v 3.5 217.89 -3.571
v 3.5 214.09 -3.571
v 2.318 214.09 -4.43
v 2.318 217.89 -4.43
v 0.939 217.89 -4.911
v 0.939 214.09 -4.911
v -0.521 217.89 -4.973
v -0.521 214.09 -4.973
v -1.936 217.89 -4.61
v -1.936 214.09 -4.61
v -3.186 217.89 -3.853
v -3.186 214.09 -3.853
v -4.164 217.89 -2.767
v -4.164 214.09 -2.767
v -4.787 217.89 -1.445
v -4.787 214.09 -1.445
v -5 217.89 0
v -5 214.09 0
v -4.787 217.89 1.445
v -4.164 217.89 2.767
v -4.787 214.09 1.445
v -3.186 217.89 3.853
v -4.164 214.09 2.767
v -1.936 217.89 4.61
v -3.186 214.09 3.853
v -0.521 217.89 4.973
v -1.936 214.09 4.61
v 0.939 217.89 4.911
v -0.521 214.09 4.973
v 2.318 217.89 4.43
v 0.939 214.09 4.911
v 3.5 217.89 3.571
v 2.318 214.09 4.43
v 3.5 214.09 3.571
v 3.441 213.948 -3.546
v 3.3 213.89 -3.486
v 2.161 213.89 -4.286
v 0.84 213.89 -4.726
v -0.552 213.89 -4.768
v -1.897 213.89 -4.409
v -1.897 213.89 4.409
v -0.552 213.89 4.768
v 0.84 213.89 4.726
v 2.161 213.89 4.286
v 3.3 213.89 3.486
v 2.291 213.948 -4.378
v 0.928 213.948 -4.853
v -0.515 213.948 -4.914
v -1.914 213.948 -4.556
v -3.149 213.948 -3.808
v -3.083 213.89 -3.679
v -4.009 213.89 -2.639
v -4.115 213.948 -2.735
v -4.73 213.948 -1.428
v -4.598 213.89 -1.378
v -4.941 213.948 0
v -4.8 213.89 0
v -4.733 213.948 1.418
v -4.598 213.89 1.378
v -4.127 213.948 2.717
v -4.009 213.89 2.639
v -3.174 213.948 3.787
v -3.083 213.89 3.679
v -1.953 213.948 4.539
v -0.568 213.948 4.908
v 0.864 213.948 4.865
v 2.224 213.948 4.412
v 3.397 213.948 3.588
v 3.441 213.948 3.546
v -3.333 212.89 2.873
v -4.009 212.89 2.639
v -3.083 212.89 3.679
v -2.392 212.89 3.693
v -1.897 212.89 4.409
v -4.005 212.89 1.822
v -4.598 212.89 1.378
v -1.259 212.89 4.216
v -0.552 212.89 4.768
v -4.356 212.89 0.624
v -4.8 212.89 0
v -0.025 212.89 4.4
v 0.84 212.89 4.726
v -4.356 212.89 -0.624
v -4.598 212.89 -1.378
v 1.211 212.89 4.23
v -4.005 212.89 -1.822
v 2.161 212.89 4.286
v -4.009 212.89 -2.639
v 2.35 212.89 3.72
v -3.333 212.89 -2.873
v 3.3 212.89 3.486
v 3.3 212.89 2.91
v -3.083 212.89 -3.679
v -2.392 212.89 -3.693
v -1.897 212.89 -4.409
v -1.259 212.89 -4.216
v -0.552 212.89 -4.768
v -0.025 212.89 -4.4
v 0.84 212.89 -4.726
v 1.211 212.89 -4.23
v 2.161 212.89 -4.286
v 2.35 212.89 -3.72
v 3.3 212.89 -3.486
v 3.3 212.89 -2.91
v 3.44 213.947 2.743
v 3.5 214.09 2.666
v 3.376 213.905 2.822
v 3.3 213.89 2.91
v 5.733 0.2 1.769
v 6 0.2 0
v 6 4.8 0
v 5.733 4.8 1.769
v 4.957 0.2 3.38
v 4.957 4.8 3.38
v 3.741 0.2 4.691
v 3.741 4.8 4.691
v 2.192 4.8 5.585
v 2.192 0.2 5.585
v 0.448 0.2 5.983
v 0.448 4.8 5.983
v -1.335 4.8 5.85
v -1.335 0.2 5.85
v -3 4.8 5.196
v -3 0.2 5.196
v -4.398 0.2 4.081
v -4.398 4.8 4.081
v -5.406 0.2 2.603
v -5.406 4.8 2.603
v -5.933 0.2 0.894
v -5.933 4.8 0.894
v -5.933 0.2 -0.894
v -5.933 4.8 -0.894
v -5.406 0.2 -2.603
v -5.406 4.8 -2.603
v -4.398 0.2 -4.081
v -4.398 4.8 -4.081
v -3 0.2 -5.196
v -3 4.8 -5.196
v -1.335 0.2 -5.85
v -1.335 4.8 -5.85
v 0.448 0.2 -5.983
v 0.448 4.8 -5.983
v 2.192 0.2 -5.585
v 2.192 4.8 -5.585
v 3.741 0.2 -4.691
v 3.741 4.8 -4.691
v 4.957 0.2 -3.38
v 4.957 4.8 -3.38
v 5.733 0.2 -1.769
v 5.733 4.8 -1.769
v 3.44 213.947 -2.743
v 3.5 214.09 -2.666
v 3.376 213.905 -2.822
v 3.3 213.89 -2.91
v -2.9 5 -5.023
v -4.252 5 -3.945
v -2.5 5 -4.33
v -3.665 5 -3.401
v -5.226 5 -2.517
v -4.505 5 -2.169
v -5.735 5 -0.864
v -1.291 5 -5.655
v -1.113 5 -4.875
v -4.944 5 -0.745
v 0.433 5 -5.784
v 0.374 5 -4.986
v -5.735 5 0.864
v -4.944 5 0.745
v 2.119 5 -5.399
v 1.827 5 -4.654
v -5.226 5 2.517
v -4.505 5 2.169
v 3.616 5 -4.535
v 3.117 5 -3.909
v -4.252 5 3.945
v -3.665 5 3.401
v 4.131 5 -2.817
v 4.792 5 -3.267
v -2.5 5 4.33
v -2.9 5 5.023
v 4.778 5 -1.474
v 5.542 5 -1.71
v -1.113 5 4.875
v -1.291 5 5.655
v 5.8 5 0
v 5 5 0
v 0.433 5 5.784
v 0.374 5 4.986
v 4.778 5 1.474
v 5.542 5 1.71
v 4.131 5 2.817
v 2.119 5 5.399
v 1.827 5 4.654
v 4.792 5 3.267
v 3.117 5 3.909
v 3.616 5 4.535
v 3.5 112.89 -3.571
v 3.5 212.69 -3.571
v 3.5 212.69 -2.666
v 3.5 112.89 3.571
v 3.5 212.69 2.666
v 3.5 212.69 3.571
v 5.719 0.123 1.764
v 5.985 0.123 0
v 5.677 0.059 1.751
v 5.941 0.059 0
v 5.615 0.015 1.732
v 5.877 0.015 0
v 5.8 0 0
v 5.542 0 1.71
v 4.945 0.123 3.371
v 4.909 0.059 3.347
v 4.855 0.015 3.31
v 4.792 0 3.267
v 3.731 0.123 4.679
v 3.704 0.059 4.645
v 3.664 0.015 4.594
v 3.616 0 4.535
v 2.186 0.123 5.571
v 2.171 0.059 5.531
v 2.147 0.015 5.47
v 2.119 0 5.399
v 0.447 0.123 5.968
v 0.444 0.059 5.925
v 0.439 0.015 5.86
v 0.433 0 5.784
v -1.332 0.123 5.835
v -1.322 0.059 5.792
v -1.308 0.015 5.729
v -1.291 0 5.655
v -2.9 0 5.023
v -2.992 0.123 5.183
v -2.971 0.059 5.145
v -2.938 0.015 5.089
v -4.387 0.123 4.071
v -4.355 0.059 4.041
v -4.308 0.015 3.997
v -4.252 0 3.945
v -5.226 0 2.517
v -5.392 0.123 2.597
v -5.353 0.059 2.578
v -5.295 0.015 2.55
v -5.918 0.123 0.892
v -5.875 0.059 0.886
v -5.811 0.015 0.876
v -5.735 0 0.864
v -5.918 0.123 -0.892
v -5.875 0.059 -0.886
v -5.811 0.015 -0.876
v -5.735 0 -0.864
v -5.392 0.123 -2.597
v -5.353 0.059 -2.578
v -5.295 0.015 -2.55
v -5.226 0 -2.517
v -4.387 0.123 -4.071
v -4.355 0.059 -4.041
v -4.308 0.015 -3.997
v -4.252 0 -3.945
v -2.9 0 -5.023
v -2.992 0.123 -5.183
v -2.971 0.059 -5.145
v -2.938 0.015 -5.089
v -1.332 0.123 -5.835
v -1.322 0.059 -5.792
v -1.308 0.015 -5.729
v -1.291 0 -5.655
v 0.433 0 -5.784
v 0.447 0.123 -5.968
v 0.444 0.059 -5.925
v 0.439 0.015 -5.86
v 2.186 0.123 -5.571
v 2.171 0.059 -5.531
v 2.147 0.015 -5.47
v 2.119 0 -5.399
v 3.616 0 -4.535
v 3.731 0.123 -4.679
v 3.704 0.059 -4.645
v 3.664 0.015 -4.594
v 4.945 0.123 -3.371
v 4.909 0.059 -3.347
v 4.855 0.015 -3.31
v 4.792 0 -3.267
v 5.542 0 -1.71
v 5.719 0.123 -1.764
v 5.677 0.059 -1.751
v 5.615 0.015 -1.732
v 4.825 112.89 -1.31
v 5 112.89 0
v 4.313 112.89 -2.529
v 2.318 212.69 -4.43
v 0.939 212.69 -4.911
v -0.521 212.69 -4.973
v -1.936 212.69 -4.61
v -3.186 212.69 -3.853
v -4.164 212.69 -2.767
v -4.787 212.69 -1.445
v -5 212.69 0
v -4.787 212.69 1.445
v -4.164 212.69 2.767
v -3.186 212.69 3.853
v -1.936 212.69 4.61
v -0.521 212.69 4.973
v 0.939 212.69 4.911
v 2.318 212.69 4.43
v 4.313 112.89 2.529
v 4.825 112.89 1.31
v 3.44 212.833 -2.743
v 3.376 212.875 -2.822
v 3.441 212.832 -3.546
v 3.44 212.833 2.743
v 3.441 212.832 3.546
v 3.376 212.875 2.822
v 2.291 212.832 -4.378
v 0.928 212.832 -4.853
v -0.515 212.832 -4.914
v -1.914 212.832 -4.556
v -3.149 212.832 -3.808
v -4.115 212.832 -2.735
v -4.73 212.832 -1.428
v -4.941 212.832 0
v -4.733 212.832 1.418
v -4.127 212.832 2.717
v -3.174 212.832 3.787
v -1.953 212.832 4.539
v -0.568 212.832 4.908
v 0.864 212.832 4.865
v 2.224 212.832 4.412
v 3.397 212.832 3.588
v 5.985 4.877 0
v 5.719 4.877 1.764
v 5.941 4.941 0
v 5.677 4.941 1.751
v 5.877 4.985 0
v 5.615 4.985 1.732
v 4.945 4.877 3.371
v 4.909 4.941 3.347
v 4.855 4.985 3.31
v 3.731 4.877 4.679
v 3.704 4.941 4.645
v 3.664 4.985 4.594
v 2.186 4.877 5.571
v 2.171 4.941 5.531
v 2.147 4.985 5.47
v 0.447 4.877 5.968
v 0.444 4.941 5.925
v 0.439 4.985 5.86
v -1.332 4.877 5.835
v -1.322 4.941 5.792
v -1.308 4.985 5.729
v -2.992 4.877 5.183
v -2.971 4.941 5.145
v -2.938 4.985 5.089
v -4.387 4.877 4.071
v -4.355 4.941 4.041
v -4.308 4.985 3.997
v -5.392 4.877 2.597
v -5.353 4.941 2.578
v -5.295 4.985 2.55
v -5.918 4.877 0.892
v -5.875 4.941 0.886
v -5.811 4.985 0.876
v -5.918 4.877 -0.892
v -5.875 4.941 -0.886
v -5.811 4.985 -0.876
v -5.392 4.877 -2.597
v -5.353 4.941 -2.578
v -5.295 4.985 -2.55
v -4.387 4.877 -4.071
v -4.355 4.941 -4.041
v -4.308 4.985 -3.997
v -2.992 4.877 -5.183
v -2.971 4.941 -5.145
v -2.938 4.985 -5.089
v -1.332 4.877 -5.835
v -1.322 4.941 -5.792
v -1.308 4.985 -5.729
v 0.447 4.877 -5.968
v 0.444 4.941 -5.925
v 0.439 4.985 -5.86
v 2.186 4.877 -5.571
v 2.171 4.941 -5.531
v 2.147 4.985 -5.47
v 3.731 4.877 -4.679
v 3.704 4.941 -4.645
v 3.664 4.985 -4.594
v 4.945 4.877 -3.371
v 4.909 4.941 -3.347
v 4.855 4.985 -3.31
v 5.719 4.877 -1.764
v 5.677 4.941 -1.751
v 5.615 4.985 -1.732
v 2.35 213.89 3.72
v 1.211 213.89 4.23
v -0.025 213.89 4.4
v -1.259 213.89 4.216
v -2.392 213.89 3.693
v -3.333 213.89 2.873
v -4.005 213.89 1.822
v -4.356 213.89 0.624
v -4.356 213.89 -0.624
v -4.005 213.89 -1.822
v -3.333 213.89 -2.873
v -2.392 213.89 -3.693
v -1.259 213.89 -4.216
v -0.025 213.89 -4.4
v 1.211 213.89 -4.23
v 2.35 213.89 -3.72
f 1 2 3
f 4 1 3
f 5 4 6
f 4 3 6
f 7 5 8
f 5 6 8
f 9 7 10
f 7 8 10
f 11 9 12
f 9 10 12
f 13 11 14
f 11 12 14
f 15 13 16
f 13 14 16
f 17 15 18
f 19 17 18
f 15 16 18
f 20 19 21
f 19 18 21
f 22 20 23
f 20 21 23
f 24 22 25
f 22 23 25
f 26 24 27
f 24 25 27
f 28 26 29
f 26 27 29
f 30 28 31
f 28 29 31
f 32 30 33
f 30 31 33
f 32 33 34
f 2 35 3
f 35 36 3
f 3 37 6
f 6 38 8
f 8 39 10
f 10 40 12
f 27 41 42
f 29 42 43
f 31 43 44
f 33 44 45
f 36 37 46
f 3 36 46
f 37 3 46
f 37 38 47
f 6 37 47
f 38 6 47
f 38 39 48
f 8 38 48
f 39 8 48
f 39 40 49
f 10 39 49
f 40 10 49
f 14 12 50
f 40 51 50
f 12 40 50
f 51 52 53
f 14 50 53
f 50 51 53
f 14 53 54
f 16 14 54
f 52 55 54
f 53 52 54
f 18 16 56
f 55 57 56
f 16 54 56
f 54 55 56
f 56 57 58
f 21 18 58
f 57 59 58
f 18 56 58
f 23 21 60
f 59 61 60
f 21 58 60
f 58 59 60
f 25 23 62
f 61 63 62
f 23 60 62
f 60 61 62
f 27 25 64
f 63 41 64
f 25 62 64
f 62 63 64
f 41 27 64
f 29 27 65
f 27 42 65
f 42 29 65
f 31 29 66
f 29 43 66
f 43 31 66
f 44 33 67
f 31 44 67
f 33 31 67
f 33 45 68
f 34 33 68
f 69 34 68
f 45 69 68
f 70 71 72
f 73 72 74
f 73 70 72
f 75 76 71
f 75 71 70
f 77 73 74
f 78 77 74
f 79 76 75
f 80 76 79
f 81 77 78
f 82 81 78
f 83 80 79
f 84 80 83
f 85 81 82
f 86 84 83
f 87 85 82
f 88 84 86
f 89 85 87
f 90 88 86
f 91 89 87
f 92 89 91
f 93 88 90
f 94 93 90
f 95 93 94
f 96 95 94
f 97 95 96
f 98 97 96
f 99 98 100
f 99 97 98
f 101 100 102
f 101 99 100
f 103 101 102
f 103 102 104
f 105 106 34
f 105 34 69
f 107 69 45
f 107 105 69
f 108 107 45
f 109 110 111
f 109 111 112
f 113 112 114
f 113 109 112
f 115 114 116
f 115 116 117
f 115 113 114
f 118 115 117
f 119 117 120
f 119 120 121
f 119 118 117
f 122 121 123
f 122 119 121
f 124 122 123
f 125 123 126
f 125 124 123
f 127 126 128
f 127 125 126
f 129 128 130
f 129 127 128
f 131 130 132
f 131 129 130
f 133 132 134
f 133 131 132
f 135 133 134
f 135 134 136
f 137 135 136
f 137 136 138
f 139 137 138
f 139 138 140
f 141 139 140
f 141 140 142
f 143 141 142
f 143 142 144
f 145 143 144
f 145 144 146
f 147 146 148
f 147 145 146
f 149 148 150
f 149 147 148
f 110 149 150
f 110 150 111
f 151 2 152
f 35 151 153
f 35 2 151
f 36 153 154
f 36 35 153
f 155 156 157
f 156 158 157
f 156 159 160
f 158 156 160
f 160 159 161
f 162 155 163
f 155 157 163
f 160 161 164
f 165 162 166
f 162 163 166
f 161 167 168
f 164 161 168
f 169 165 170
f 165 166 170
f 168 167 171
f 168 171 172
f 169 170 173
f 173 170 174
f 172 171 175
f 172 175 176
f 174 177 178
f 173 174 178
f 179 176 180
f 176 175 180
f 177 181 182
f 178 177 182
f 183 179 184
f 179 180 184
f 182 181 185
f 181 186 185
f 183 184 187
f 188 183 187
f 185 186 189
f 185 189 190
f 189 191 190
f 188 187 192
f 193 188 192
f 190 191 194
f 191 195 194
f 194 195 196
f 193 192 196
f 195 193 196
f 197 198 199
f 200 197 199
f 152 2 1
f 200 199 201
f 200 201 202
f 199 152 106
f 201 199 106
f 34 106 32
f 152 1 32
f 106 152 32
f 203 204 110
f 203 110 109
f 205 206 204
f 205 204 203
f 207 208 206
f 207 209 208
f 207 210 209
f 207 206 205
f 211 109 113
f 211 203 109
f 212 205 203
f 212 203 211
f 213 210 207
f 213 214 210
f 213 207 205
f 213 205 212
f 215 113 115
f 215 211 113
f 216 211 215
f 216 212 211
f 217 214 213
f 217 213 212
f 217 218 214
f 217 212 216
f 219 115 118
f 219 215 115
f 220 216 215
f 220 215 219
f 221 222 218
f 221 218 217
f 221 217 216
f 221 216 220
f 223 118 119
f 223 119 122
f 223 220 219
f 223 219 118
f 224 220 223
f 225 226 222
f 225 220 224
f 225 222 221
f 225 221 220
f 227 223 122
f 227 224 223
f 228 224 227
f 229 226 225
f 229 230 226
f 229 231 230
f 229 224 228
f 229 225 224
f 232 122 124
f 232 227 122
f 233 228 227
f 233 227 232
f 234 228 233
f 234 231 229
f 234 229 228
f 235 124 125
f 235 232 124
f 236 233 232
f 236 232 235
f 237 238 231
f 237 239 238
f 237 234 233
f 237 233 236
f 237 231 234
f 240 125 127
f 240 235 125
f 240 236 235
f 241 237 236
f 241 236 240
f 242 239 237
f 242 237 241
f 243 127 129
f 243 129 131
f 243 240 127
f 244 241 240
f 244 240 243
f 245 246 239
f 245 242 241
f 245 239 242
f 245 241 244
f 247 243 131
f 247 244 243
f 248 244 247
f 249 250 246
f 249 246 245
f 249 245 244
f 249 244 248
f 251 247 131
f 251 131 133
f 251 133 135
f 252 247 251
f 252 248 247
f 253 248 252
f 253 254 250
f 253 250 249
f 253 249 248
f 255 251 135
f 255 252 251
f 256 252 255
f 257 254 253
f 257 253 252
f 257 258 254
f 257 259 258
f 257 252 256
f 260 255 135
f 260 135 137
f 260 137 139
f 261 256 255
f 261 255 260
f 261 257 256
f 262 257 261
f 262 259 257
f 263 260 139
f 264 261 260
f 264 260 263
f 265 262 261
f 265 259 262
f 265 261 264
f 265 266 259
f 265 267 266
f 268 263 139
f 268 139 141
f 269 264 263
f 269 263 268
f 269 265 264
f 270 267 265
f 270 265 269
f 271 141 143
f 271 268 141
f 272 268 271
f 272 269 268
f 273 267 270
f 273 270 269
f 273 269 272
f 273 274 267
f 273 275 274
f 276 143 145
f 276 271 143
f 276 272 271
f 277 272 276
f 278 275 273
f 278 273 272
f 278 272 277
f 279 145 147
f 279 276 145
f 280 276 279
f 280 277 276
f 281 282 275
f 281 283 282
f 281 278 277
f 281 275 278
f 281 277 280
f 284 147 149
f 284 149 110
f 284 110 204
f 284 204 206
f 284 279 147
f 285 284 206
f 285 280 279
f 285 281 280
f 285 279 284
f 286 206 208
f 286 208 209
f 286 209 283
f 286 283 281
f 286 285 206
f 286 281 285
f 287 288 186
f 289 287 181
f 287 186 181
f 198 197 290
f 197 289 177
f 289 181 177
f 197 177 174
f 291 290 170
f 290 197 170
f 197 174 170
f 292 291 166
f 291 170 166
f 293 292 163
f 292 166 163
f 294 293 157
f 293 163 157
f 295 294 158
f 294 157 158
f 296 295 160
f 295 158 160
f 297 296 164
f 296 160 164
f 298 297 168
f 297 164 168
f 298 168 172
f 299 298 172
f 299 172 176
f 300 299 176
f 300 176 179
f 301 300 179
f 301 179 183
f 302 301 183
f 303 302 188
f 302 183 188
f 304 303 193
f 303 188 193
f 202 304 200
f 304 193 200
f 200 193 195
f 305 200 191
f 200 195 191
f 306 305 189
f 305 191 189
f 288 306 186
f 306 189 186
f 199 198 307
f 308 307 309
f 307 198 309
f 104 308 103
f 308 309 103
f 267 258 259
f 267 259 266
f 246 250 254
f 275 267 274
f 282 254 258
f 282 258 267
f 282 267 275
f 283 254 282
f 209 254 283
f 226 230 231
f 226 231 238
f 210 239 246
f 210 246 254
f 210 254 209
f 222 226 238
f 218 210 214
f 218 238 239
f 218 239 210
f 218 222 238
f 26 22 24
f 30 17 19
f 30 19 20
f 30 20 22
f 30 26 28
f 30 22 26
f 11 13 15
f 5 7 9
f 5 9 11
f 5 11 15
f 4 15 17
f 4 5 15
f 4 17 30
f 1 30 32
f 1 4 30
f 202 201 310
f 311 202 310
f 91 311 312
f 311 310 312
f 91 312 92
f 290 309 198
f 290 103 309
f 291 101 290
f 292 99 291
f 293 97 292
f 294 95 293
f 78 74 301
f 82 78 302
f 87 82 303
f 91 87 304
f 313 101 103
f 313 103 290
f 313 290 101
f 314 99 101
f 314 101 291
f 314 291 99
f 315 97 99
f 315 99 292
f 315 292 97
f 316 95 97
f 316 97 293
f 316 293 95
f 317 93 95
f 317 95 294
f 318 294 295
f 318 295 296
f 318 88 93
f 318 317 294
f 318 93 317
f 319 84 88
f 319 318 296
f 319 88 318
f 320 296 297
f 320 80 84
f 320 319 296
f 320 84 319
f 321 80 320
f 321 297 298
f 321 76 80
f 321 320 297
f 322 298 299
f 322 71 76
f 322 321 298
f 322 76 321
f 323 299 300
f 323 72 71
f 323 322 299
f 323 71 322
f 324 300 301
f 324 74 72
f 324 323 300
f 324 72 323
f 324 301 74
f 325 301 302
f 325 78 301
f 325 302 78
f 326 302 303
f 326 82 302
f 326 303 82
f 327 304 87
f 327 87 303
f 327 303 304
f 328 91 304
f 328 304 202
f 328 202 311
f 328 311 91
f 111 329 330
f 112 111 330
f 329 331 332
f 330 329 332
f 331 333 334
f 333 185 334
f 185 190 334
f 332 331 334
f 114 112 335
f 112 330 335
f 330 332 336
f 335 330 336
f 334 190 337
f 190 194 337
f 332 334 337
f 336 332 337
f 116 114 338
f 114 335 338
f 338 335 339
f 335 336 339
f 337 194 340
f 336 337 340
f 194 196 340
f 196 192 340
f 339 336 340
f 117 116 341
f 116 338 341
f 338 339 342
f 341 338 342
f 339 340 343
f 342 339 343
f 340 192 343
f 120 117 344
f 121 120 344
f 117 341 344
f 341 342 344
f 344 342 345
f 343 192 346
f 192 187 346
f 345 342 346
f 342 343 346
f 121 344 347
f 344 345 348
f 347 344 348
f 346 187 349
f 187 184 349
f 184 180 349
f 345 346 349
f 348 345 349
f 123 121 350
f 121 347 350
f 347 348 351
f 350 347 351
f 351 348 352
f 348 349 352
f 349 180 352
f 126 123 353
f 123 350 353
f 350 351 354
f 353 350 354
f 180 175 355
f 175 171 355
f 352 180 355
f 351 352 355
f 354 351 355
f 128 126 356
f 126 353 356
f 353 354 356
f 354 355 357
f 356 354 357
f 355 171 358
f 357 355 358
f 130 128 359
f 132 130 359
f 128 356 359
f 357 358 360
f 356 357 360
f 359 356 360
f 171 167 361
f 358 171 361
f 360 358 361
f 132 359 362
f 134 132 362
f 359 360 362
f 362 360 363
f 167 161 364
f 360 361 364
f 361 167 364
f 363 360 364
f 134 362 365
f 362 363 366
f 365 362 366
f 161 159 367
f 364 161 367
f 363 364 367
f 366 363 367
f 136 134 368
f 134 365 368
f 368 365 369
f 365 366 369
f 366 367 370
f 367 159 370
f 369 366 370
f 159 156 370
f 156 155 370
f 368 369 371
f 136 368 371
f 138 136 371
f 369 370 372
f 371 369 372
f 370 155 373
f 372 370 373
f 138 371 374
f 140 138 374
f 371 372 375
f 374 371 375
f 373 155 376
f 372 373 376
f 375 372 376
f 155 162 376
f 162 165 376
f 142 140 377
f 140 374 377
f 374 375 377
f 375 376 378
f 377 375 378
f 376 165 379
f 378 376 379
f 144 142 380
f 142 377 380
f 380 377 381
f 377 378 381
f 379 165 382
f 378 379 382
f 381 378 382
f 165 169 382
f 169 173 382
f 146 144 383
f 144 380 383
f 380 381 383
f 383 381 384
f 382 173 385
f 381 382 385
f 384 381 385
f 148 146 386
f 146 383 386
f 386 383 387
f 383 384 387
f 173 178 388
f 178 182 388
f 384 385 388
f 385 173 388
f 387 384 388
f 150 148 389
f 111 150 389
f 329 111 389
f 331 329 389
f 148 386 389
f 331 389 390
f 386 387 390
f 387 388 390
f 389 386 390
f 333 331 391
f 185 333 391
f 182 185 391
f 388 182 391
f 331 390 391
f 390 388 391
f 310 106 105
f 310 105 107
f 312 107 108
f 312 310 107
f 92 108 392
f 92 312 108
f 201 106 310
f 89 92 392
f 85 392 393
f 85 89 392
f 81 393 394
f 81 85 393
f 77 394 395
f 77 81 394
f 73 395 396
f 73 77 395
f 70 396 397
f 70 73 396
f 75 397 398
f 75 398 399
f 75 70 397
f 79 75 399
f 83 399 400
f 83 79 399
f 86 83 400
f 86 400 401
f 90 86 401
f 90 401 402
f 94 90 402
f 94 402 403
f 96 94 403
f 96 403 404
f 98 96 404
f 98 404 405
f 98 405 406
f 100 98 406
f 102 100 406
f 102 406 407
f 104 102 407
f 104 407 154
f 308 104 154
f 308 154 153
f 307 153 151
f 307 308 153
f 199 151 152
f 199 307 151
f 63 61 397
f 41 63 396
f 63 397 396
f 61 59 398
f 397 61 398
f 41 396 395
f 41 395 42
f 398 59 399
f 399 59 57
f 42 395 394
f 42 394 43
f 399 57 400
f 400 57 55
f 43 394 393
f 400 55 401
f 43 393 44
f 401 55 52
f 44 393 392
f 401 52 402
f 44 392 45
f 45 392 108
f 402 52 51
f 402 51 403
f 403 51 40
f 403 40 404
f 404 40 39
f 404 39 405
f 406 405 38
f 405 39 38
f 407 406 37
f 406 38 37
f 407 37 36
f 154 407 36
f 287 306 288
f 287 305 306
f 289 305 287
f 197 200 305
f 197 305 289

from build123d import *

# Parameters (mm, degrees)
SKETCH1_R           = 5
BOSS_EXTRUDE1_DEPTH = 217.89
CUT_EXTRUDE2_DEPTH  = 105
CUT_EXTRUDE3_START  = -5
CUT_EXTRUDE3_DEPTH  = 1
FILLET1_R           = 0.2
SKETCH5_R           = 6
SKETCH5_R_2         = 5
BOSS_EXTRUDE2_DEPTH = 5
FILLET2_R           = 0.2


with BuildPart() as part:
    # Sketch1 → Boss-Extrude1 (new body)
    with BuildSketch(Plane(origin=(0, 0, 0), x_dir=(1, 0, 0), z_dir=(0, 1, 0))):
        Circle(SKETCH1_R)
    extrude(amount=BOSS_EXTRUDE1_DEPTH)

    # Sketch3 → Cut-Extrude2 (cut)
    with BuildSketch(Plane(origin=(0, 217.89, 0), x_dir=(1, 0, 0), z_dir=(0, 1, 0))):
        Polygon((3.5, 37.712556906), (3.5, 3.570714214), (3.5, -3.570714214), (3.5, -37.712556906), (71.783685384, -37.712556906), (71.783685384, 37.712556906), align=None)
    extrude(amount=-CUT_EXTRUDE2_DEPTH, mode=Mode.SUBTRACT)

    # Sketch4 → Cut-Extrude3 (cut)
    with BuildSketch(Plane(origin=(0, 217.89, 0), x_dir=(1, 0, 0), z_dir=(0, 1, 0)).offset(CUT_EXTRUDE3_START)):
        with BuildLine():
            Line((3.5, 2.666458325), (3.5, 3.570714214))
            ThreePointArc((3.5, 3.570714214), (-5, 0), (3.5, -3.570714214))
            Line((3.5, -3.570714214), (3.5, -2.666458325))
            ThreePointArc((3.5, -2.666458325), (-4.4, 0), (3.5, 2.666458325))
        make_face()
    extrude(amount=CUT_EXTRUDE3_DEPTH, mode=Mode.SUBTRACT)

    # Fillet1
    fillet1_edges = [part.edges().sort_by_distance(p)[0] for p in [
        (3.5, 212.89, -3.11858627),
        (-5, 212.89, 0),
        (3.5, 212.89, 3.11858627),
        (3.5, 213.89, -3.11858627),
        (-5, 213.89, 0),
        (3.5, 213.89, 3.11858627),
    ]]
    fillet(fillet1_edges, radius=FILLET1_R)

    # Sketch5 → Boss-Extrude2 (add)
    with BuildSketch(Plane.XZ):
        Circle(SKETCH5_R)
        Circle(SKETCH5_R_2, mode=Mode.SUBTRACT)
    extrude(amount=-BOSS_EXTRUDE2_DEPTH)

    # Fillet2
    fillet2_edges = [part.edges().sort_by_distance(p)[0] for p in [
        (-6, 5, 0),
        (-6, 0, 0),
    ]]
    fillet(fillet2_edges, radius=FILLET2_R)


solid = part.part
